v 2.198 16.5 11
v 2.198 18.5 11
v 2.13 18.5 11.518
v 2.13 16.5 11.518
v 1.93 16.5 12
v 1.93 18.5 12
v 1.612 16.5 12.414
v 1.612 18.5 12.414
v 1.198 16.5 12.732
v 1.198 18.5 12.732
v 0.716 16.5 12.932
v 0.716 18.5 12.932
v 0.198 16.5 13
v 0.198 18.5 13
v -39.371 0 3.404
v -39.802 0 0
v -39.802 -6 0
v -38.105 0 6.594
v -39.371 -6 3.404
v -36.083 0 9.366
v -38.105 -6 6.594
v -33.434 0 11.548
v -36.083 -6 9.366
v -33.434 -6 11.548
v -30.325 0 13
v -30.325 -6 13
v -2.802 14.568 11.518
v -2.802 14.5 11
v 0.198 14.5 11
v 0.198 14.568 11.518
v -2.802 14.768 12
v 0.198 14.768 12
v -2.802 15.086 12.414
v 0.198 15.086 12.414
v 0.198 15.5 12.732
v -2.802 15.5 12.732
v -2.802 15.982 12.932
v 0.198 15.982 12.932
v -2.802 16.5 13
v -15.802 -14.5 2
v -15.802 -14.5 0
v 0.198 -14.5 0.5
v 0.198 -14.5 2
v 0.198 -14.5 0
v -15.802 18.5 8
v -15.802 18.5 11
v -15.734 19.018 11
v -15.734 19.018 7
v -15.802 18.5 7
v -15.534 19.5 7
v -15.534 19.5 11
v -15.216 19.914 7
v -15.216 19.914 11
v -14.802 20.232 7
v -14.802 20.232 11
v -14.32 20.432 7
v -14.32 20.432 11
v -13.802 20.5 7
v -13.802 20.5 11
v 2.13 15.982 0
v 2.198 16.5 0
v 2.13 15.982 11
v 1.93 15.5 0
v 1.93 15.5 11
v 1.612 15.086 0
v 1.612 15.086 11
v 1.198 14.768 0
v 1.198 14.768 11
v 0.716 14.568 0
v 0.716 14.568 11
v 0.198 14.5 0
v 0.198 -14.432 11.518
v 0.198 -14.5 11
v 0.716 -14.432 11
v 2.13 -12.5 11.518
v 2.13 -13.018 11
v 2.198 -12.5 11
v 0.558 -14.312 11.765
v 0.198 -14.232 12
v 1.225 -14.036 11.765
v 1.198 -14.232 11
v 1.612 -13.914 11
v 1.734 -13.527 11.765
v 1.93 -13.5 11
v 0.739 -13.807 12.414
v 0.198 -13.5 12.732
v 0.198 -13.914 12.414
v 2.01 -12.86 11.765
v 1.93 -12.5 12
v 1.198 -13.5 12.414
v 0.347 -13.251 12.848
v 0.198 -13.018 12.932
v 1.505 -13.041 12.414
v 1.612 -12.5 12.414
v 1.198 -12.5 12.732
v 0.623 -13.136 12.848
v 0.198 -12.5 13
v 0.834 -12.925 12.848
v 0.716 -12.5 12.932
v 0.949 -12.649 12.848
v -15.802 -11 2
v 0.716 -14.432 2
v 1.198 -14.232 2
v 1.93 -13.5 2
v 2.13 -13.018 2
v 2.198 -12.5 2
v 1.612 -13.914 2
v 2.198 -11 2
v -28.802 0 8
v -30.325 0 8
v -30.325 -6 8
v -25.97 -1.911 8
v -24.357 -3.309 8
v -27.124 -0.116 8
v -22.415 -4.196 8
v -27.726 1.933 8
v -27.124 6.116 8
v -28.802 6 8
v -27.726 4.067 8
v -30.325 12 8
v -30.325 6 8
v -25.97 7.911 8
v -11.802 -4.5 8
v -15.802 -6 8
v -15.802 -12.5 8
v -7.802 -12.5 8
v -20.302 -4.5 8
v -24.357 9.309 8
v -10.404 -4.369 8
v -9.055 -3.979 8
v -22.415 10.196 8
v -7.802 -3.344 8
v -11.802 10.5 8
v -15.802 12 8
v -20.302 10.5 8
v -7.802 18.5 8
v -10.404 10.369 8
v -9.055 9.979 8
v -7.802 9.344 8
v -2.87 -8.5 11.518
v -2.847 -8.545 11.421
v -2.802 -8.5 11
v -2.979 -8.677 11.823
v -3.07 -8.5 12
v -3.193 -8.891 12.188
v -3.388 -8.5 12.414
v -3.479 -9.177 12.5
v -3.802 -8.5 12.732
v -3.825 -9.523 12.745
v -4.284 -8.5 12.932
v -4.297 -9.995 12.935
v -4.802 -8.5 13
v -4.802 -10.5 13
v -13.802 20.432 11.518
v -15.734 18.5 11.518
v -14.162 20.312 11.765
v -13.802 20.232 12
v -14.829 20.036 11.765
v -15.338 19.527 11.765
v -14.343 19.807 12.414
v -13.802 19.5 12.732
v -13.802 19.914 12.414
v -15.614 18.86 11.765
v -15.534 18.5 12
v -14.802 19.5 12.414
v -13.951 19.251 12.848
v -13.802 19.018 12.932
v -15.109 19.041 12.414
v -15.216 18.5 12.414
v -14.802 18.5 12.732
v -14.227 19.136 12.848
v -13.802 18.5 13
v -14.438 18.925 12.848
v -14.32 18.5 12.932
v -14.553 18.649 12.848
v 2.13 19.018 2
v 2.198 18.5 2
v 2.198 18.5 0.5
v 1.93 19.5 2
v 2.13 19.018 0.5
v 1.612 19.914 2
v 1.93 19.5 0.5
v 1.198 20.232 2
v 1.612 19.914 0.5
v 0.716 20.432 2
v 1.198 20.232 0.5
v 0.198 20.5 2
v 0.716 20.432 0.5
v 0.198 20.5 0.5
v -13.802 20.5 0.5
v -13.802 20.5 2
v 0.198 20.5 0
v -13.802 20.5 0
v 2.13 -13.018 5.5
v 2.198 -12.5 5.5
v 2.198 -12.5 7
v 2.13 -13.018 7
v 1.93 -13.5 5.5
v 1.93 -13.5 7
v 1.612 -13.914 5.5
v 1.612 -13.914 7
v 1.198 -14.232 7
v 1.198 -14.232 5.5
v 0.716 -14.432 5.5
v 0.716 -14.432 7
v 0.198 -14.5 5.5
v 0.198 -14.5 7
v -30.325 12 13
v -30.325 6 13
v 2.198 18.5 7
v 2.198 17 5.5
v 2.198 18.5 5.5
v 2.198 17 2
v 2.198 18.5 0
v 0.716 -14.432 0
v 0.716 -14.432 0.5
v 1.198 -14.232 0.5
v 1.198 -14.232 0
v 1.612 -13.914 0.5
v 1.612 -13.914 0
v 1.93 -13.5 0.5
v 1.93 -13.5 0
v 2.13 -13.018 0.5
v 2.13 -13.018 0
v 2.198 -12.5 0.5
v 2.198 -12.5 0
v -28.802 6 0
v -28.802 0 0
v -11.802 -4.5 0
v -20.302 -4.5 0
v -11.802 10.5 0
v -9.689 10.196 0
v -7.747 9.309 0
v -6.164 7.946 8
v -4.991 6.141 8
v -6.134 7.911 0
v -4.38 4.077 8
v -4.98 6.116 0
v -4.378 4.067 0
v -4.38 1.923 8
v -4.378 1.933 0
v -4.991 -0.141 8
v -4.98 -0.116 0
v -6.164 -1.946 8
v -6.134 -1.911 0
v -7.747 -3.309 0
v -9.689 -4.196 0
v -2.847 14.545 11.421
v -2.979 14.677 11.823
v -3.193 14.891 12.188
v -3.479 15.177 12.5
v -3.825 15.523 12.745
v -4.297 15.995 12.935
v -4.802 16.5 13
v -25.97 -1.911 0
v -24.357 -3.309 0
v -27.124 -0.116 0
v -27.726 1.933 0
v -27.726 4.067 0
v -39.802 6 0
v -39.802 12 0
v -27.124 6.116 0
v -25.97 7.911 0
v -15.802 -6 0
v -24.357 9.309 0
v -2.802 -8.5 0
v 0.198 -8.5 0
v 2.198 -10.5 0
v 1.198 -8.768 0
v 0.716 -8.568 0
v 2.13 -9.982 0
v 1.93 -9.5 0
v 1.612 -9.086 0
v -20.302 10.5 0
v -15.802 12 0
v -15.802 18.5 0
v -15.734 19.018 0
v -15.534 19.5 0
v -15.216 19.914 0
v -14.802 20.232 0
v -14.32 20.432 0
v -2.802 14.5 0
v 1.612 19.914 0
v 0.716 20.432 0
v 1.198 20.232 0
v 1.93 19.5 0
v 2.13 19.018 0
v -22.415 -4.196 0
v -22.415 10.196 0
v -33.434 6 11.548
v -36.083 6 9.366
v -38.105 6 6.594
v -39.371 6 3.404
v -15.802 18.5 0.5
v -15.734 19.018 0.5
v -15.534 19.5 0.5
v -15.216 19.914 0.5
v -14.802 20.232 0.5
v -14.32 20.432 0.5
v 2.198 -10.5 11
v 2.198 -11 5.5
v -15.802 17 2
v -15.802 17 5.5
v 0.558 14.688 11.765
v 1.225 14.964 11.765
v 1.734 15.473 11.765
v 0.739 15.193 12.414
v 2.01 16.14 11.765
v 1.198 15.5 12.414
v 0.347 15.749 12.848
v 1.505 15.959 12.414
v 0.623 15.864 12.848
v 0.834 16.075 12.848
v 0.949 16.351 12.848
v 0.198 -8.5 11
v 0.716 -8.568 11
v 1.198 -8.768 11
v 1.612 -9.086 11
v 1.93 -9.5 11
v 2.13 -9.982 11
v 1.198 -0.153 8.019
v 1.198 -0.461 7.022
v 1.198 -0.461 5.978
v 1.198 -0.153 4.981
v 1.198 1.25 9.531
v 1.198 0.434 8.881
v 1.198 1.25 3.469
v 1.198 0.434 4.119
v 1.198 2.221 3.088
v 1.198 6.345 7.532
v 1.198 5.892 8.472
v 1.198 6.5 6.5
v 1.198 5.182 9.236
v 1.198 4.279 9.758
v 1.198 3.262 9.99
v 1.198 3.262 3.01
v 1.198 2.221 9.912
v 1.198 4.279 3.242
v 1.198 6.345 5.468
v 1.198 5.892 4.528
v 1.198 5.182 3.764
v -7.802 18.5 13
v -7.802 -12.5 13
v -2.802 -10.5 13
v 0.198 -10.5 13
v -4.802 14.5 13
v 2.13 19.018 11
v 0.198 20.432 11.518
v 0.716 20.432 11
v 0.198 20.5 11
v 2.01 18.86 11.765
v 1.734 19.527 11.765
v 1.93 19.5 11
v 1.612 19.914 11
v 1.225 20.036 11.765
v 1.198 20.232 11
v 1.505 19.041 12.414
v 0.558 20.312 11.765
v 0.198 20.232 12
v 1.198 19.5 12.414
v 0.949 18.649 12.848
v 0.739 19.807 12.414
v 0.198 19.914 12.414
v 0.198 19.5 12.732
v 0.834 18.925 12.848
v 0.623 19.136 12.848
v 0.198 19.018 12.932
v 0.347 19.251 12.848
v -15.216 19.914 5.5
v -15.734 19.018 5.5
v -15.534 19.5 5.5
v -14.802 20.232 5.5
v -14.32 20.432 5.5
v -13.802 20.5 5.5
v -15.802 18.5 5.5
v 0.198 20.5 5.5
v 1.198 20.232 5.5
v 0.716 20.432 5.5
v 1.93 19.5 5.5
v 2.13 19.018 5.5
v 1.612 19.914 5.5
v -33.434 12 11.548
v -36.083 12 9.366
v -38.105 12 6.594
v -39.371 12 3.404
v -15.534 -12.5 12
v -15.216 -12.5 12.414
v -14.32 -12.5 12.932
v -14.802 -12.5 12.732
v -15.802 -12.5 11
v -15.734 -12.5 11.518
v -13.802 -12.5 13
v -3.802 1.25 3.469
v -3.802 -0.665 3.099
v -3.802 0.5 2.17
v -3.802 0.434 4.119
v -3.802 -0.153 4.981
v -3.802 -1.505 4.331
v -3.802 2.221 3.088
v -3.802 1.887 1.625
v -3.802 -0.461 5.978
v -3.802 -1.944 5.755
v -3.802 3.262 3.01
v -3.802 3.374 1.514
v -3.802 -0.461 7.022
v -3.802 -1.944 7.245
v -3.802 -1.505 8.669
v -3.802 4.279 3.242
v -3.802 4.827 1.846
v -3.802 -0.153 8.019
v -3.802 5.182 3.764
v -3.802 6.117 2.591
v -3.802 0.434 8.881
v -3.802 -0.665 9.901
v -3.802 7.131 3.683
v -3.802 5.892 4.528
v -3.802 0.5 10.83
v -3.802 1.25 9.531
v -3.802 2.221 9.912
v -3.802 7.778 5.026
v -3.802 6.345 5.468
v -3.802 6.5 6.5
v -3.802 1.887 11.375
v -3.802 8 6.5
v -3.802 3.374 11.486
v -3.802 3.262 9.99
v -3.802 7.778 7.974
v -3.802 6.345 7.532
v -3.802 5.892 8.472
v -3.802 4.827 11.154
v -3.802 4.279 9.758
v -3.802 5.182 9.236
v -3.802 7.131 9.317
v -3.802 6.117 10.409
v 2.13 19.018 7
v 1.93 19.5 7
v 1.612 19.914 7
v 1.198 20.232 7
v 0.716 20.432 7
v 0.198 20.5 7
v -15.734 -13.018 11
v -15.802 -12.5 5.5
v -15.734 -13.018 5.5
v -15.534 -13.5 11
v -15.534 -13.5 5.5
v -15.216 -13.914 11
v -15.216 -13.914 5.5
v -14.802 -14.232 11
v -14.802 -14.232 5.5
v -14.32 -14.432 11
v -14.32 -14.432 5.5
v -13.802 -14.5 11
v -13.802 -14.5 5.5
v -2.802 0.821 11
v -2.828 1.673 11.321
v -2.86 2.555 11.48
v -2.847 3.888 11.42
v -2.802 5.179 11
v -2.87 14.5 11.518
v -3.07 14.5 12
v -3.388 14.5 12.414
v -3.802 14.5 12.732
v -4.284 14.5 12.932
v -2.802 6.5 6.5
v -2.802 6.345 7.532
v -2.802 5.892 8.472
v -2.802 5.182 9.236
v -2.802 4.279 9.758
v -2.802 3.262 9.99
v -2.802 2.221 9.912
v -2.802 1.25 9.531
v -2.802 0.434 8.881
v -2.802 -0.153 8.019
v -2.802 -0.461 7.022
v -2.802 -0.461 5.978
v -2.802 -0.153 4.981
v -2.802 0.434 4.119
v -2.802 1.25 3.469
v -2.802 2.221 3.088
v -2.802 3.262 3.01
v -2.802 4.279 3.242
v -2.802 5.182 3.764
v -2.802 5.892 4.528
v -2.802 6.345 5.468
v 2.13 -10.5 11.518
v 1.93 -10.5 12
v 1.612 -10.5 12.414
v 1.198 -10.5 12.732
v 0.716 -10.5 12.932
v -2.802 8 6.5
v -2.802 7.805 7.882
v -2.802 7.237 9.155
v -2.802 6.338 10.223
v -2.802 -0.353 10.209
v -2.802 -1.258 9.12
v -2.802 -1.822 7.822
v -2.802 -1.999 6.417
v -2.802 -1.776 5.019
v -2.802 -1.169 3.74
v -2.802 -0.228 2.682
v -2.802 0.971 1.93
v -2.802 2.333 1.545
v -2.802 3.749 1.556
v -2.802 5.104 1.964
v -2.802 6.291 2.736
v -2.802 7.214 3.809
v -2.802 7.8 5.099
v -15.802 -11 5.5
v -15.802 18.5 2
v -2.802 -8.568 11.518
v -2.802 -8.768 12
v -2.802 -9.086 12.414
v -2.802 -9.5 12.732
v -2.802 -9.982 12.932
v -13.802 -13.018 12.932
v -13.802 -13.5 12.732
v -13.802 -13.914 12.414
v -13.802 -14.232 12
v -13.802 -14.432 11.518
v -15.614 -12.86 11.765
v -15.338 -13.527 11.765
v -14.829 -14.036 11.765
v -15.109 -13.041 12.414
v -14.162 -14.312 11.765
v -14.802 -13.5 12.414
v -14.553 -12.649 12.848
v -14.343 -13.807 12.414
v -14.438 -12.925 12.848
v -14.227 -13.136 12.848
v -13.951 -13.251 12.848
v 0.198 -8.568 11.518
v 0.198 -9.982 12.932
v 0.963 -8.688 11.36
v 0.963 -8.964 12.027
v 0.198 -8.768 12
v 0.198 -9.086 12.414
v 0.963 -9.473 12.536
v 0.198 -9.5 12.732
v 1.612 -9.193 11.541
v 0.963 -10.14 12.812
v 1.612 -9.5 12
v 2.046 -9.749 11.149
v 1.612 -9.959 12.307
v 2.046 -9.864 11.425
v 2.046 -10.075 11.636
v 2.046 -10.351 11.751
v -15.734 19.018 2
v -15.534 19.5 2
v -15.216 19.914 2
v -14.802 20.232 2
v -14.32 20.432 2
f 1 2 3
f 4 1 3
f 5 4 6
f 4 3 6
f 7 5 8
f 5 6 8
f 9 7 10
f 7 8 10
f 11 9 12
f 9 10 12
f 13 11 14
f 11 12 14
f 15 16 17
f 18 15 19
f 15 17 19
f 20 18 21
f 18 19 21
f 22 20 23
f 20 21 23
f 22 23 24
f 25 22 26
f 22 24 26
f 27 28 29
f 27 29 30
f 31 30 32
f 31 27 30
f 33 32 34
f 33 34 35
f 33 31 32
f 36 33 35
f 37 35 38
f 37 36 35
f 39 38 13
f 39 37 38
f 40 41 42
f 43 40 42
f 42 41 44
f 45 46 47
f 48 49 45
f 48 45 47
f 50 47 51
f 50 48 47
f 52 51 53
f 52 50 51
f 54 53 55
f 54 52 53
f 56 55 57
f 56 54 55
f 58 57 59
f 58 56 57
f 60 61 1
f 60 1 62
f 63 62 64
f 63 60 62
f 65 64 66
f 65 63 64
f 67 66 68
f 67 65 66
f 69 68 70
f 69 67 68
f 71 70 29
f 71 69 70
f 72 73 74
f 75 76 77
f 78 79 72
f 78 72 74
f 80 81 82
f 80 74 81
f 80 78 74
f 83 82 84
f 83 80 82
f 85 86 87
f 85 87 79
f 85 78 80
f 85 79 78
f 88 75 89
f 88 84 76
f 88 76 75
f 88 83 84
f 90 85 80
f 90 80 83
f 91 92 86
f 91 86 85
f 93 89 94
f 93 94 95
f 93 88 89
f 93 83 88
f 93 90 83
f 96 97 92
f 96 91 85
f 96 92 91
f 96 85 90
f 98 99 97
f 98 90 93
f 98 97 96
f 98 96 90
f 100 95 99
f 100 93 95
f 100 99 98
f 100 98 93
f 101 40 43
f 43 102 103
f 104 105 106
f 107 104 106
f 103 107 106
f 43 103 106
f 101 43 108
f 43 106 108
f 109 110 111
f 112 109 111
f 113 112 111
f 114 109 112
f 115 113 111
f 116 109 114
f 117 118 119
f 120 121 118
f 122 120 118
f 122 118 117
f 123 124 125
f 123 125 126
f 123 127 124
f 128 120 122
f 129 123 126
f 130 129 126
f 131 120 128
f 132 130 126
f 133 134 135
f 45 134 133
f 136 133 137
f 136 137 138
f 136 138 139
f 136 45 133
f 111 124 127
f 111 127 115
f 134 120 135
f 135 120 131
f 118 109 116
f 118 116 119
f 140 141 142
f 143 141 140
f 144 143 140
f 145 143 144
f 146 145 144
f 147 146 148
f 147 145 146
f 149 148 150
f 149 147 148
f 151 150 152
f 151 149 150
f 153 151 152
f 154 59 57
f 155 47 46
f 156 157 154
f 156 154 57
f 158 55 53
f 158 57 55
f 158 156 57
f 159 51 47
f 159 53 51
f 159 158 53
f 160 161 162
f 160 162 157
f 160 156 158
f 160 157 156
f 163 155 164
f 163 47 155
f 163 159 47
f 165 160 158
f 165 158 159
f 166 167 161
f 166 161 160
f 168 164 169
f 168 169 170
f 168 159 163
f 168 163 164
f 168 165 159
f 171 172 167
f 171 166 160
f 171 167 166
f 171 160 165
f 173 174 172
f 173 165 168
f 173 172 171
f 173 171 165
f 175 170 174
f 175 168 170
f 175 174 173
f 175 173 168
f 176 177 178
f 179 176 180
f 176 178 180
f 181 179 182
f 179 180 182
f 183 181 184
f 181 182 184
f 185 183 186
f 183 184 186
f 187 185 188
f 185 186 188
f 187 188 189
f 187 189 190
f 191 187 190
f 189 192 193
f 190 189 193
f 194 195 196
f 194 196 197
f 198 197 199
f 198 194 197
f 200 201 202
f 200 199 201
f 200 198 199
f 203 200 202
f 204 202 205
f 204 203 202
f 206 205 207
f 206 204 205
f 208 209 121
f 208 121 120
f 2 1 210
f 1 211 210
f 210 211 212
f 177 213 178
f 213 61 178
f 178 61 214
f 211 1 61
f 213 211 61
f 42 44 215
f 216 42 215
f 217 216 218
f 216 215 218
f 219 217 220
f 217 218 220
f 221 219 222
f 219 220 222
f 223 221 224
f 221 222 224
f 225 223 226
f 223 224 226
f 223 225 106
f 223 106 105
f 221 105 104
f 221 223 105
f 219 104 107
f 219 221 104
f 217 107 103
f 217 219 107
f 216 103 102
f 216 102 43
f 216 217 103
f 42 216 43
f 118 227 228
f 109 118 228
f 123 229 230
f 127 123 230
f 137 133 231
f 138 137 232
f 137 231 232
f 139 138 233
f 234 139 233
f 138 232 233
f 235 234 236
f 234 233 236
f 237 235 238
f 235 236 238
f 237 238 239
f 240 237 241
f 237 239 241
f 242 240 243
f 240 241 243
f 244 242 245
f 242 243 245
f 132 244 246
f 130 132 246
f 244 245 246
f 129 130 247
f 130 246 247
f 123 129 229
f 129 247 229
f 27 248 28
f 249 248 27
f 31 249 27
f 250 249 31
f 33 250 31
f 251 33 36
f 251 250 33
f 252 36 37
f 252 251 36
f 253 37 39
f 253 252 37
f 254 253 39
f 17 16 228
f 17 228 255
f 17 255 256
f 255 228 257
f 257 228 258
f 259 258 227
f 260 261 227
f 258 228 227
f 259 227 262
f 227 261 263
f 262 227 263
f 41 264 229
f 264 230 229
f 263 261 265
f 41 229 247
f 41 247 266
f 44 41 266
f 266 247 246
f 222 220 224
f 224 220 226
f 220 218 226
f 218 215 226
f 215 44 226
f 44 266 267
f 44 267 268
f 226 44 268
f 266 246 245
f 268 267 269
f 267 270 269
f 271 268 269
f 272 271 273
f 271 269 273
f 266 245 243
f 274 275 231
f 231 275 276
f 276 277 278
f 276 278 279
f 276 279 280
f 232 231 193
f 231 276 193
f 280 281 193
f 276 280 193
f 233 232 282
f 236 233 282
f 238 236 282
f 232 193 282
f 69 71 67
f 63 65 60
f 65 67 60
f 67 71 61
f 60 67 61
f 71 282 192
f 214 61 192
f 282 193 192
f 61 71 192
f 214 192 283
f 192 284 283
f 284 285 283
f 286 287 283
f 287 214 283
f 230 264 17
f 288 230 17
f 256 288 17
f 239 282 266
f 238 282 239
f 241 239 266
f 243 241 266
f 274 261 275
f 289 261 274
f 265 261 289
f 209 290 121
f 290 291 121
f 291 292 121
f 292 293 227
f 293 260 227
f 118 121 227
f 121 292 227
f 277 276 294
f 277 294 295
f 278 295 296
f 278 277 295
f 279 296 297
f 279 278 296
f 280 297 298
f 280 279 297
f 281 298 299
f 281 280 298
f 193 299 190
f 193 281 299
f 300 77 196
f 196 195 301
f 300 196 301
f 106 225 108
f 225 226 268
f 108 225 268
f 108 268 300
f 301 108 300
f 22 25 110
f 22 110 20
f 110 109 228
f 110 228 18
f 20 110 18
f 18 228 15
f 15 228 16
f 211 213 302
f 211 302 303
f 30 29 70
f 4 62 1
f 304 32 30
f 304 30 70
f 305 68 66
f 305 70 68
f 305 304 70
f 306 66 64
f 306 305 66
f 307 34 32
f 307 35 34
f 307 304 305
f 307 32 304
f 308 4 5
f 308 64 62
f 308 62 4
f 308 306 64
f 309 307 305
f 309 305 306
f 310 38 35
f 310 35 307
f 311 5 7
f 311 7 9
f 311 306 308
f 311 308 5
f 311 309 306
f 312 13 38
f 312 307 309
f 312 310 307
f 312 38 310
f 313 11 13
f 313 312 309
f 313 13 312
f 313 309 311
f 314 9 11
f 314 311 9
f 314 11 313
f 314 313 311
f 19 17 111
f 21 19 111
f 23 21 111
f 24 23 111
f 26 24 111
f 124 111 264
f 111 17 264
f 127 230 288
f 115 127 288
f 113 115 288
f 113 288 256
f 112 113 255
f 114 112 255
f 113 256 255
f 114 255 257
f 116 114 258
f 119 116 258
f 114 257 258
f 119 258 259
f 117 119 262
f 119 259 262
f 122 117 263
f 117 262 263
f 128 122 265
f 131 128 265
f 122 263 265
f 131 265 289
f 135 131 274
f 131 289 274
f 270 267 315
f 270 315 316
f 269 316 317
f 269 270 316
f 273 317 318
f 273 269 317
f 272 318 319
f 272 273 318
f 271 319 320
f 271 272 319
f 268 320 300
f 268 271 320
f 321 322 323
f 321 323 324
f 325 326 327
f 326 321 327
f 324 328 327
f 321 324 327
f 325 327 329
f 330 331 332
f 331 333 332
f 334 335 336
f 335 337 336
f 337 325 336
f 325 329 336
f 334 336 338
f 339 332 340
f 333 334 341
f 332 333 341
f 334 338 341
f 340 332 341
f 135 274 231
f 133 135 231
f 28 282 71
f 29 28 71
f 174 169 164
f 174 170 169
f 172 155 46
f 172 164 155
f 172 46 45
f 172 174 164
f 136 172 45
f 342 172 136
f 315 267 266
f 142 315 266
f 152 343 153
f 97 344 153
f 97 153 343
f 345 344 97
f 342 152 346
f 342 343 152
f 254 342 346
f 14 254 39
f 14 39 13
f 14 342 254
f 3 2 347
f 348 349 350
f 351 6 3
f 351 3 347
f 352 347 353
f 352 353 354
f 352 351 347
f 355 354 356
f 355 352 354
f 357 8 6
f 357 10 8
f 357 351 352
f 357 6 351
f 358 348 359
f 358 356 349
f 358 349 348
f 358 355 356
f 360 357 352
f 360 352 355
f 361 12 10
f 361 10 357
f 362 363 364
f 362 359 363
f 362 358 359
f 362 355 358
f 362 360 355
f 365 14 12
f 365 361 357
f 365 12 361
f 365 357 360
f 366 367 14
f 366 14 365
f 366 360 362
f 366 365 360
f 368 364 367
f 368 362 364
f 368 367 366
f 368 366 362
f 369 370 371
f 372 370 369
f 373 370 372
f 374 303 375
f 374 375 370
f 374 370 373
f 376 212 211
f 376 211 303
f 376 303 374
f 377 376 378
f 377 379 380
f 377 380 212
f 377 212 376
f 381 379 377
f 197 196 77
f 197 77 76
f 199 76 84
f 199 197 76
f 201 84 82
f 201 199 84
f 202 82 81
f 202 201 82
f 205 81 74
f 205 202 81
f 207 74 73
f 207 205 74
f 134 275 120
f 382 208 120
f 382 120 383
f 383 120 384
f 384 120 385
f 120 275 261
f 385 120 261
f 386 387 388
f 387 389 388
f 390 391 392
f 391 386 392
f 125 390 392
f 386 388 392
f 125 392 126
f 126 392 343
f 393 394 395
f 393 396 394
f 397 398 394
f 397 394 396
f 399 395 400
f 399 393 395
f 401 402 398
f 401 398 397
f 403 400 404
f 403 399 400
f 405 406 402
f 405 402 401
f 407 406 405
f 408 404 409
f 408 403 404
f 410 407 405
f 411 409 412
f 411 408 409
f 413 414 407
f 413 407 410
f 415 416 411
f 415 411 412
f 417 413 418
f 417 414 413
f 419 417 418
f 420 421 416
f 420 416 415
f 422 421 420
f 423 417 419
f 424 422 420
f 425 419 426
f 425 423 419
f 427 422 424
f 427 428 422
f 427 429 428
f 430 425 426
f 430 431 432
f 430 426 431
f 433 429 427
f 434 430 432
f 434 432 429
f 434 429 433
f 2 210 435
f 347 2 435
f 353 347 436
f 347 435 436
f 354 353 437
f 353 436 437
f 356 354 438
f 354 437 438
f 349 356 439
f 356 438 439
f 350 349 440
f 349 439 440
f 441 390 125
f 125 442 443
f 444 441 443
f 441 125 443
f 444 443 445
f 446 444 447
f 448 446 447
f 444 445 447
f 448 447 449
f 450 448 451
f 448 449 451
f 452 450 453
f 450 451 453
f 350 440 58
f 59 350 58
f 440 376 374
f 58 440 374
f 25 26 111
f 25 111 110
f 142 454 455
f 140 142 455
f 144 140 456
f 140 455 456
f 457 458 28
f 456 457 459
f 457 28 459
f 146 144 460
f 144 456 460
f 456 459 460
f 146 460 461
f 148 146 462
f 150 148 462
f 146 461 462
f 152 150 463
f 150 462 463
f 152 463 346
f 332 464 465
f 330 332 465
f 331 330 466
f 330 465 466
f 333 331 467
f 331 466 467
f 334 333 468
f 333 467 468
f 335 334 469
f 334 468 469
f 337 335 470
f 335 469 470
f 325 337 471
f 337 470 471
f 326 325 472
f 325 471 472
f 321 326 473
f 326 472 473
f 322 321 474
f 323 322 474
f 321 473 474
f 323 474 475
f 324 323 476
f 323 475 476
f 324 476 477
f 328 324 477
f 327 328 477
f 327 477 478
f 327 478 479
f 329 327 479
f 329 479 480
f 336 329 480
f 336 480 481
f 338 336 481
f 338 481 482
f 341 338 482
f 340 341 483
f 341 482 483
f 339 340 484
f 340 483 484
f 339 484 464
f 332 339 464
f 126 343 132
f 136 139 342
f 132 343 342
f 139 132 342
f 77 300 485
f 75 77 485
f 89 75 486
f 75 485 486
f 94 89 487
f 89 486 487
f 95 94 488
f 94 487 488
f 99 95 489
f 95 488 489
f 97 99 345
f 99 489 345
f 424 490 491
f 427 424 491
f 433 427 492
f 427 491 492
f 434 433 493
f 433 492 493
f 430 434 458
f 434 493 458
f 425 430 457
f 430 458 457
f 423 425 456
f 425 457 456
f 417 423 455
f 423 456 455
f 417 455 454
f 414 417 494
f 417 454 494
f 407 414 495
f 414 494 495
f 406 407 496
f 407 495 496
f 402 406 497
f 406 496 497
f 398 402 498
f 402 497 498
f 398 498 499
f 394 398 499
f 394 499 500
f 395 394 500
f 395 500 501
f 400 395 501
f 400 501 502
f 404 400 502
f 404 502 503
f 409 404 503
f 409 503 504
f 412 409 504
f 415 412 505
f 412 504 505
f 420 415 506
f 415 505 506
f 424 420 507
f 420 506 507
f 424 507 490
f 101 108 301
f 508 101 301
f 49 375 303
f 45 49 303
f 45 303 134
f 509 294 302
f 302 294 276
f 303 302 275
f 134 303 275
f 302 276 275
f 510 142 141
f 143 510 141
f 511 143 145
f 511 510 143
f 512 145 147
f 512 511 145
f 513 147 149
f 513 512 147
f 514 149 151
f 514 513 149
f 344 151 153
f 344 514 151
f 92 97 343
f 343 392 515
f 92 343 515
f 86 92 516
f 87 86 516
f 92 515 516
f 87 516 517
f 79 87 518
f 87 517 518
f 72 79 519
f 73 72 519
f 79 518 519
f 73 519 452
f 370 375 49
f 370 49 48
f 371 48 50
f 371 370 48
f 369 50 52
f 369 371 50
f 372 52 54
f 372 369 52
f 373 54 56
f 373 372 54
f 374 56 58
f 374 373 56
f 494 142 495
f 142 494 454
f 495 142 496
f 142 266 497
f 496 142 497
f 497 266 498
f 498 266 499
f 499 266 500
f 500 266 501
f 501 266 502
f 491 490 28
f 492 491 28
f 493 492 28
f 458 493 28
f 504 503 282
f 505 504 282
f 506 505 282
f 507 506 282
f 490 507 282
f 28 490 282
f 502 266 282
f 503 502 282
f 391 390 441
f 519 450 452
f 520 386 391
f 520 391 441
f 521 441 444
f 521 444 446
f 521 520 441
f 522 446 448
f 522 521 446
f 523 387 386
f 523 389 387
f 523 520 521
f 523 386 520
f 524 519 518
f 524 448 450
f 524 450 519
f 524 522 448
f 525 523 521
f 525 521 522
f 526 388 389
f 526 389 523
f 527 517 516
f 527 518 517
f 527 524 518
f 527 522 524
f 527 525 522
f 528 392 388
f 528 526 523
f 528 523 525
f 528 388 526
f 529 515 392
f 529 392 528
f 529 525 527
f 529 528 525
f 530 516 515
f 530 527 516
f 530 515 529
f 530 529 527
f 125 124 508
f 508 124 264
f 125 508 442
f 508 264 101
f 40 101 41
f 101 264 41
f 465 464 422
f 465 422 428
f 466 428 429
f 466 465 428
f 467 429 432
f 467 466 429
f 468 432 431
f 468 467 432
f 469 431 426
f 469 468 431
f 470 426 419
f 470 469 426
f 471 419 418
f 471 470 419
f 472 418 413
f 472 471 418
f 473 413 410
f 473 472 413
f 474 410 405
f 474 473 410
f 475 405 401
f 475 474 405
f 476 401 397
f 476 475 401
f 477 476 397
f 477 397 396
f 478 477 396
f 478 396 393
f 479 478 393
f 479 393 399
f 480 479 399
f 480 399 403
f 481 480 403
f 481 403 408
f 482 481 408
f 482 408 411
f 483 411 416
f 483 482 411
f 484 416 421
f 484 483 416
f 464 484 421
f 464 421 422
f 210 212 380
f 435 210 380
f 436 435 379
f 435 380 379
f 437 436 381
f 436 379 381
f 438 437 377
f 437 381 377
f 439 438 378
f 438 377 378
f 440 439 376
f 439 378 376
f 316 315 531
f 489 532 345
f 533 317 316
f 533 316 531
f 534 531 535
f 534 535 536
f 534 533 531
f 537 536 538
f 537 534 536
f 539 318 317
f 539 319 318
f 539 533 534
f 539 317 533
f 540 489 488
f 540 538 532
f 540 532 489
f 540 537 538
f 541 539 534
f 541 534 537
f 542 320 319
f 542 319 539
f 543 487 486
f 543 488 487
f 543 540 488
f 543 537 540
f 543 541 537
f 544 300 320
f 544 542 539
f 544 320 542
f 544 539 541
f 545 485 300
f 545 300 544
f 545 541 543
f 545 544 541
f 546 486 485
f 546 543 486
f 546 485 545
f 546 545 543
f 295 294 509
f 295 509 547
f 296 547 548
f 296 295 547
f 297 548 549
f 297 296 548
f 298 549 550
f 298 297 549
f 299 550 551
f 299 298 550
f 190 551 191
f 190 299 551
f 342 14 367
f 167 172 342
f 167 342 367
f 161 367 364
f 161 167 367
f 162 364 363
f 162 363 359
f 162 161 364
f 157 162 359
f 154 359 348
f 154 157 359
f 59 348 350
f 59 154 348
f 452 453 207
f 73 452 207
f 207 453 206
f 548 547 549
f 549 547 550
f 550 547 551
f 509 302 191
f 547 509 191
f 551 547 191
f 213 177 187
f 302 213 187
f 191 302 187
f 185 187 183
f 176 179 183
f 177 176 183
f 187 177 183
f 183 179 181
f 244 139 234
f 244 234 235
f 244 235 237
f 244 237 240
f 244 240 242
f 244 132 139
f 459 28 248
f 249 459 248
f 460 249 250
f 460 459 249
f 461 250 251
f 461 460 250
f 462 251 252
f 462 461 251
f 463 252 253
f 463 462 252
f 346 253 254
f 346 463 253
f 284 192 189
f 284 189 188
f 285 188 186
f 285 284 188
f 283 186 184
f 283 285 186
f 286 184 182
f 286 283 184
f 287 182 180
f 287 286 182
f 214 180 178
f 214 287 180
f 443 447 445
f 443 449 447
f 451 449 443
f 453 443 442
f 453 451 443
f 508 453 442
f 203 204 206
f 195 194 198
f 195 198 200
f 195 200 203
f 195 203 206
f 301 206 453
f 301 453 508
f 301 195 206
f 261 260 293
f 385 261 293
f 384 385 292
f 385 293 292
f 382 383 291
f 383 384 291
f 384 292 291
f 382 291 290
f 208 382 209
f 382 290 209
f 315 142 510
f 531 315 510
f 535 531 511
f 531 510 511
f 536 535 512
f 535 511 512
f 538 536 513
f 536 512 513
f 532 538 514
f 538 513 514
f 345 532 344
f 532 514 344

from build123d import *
from build123d import SkipClean  # not in build123d's __all__

# Parameters (mm, degrees)
F0_W          = 10
F0_H          = 6
F1_DEPTH      = 13
F3_DEPTH      = 25
F4_W          = 22.5231910496
F4_H          = 31
F5_DEPTH      = 5
F7_DEPTH      = 8
F8_R          = 5
F8_R_2        = 3.5
F9_DEPTH      = 1
F10_DEPTH     = 4
F11_W         = 3.5
F11_H         = 3.5
F12_DEPTH     = 42.001
F13_W         = 3.5
F13_H         = 3.5
F14_DEPTH     = 42.001
F15_T1_DEPTH  = 14
F15_T3_DEPTH  = 2
F15_T5_DEPTH  = 3
F15_T7_DEPTH  = 23
F15_T9_DEPTH  = 2
F15_T11_DEPTH = 10.5
F15_T13_DEPTH = 12
F15_T15_DEPTH = 16
F15_T17_DEPTH = 5.5
F15_S21_W     = 2.04
F15_S21_H     = 2.04
F15_T22_DEPTH = 2.04
F15_S27_W     = 2.04
F15_S27_H     = 2.04
F15_T28_DEPTH = 2.04
F15_S33_W     = 2.04
F15_S33_H     = 2.04
F15_T34_DEPTH = 2.04
F15_S39_W     = 2.04
F15_S39_H     = 2.04
F15_T40_DEPTH = 2.04
F15_S45_W     = 2.04
F15_S45_H     = 2.04
F15_T46_DEPTH = 2.04
F15_S51_W     = 2.04
F15_S51_H     = 2.04
F15_T52_DEPTH = 2.04
F15_T59_DEPTH = 28
F15_T63_DEPTH = 8
F15_T70_DEPTH = 8
F15_T74_DEPTH = 28


# Not quite as in the source:
# - a fillet or chamfer that OpenCascade refuses, or shapes differently, is made with other operations: its cross-section is extruded or revolved along the edge and cut away or added


with BuildPart() as f1:
    # F0 (on Top) → F1 (new body)
    with BuildSketch(Plane.XY):
        with Locations((-34.8019978553, 9)):
            Rectangle(F0_W, F0_H)
        with Locations((-34.8019978553, -3)):
            Rectangle(F0_W, F0_H)
        Polygon((2.1980021447, 20.5), (-15.8019978553, 20.5), (-15.8019978553, 12), (-29.8019978553, 12), (-29.8019978553, 6), (-28.8019978553, 6), (-28.8019978553, 0), (-29.8019978553, 0), (-29.8019978553, -6), (-15.8019978553, -6), (-15.8019978553, -14.5), (2.1980021447, -14.5), (2.1980021447, -8.5), (-2.8019978553, -8.5), (-2.8019978553, 14.5), (2.1980021447, 14.5), align=None)
    extrude(amount=F1_DEPTH)

    # F2 (on face) → F3 (cut)
    with BuildSketch(Plane.XZ.offset(6)):
        with BuildLine():
            Line((-39.8019978553, 13), (-39.8019978553, 0))
            ThreePointArc((-39.8019978553, 0), (-37.1813109556, 8.0437849903), (-30.3251889049, 13))
            Line((-30.3251889049, 13), (-39.8019978553, 13))
        make_face()
    extrude(amount=-F3_DEPTH, mode=Mode.SUBTRACT)

    # F4 (on face) → F5 (cut)
    with BuildSketch(Plane.XY.offset(13)):
        with Locations((-19.0635933801, 3)):
            Rectangle(F4_W, F4_H)
    extrude(amount=-F5_DEPTH, mode=Mode.SUBTRACT)

    # F6 (on face) → F7 (cut, through all)
    with BuildSketch(Plane(origin=(0, 0, 0), x_dir=(1, 0, 0), z_dir=(0, 0, -1))):
        with BuildLine():
            Line((-11.8019978553, 4.5), (-20.3019978553, 4.5))
            ThreePointArc((-20.3019978553, 4.5), (-27.8019978553, -3), (-20.3019978553, -10.5))
            Line((-20.3019978553, -10.5), (-11.8019978553, -10.5))
            ThreePointArc((-11.8019978553, -10.5), (-4.3019978553, -3), (-11.8019978553, 4.5))
        make_face()
    extrude(amount=-F7_DEPTH, mode=Mode.SUBTRACT)

    # F8 (on face) → F9 (cut)
    with BuildSketch(Plane.YZ.offset(-2.8019978553)):
        with Locations((3, 6.5)):
            Circle(F8_R)
        with Locations((3, 6.5)):
            Circle(F8_R_2, mode=Mode.SUBTRACT)
    extrude(amount=-F9_DEPTH, mode=Mode.SUBTRACT)

    # F10 (add): a face of the model
    f10_faces = [f1.faces().sort_by_distance(p)[0] for p in [
        (-2.8019978553, 3, 6.5),
    ]]
    extrude(f10_faces, amount=F10_DEPTH)

    # F11 (on face) → F12 (cut, through all)
    with BuildSketch(Plane.YZ.offset(2.1980021447)):
        with Locations((-12.75, 3.75)):
            Rectangle(F11_W, F11_H)
    extrude(amount=-F12_DEPTH, mode=Mode.SUBTRACT)

    # F13 (on face) → F14 (cut, through all)
    with BuildSketch(Plane.YZ.offset(2.1980021447)):
        with Locations((18.75, 3.75)):
            Rectangle(F13_W, F13_H)
    extrude(amount=-F14_DEPTH, mode=Mode.SUBTRACT)

    # F15: fillet of radius 2 on 18 edges, made by hand

    # F15_s2 → F15_t1 (cut)
    with BuildSketch(Plane.YZ.offset(-13.8019978553)):
        with BuildLine():
            ThreePointArc((-12.5, 13), (-13.9142135624, 12.4142135624), (-14.5, 11))
            Line((-14.5, 11), (-14.5, 13))
            Line((-14.5, 13), (-12.5, 13))
        make_face()
        with BuildLine():
            ThreePointArc((18.5, 13), (19.9142135624, 12.4142135624), (20.5, 11))
            Line((20.5, 11), (20.5, 13))
            Line((20.5, 13), (18.5, 13))
        make_face()
    extrude(amount=F15_T1_DEPTH, mode=Mode.SUBTRACT)

    # F15_s4 → F15_t3 (cut)
    with BuildSketch(Plane.XZ.offset(10.5)):
        with BuildLine():
            ThreePointArc((2.1980021447, 11), (1.6122157071, 12.4142135624), (0.1980021447, 13))
            Line((0.1980021447, 13), (2.1980021447, 13))
            Line((2.1980021447, 13), (2.1980021447, 11))
        make_face()
    extrude(amount=F15_T3_DEPTH, mode=Mode.SUBTRACT)

    # F15_s6 → F15_t5 (cut)
    with BuildSketch(Plane.YZ.offset(-2.8019978553)):
        with BuildLine():
            ThreePointArc((-8.5, 11), (-9.0857864376, 12.4142135624), (-10.5, 13))
            Line((-10.5, 13), (-8.5, 13))
            Line((-8.5, 13), (-8.5, 11))
        make_face()
        with BuildLine():
            ThreePointArc((14.5, 11), (15.0857864376, 12.4142135624), (16.5, 13))
            Line((16.5, 13), (14.5, 13))
            Line((14.5, 13), (14.5, 11))
        make_face()
    extrude(amount=F15_T5_DEPTH, mode=Mode.SUBTRACT)

    # F15_s8 → F15_t7 (cut)
    with BuildSketch(Plane.XZ.offset(-14.5)):
        with BuildLine():
            ThreePointArc((-2.8019978553, 11), (-3.3877842929, 12.4142135624), (-4.8019978553, 13))
            Line((-4.8019978553, 13), (-2.8019978553, 13))
            Line((-2.8019978553, 13), (-2.8019978553, 11))
        make_face()
    extrude(amount=F15_T7_DEPTH, mode=Mode.SUBTRACT)

    # F15_s10 → F15_t9 (cut)
    with BuildSketch(Plane.XZ.offset(-18.5)):
        with BuildLine():
            ThreePointArc((2.1980021447, 11), (1.6122157071, 12.4142135624), (0.1980021447, 13))
            Line((0.1980021447, 13), (2.1980021447, 13))
            Line((2.1980021447, 13), (2.1980021447, 11))
        make_face()
    extrude(amount=F15_T9_DEPTH, mode=Mode.SUBTRACT)

    # F15_s12 → F15_t11 (cut)
    with BuildSketch(Plane.XY.offset(0.5)):
        with BuildLine():
            ThreePointArc((2.1980021447, 18.5), (1.6122157071, 19.9142135624), (0.1980021447, 20.5))
            Line((0.1980021447, 20.5), (2.1980021447, 20.5))
            Line((2.1980021447, 20.5), (2.1980021447, 18.5))
        make_face()
        with BuildLine():
            ThreePointArc((-15.8019978553, 18.5), (-15.2162114177, 19.9142135624), (-13.8019978553, 20.5))
            Line((-13.8019978553, 20.5), (-15.8019978553, 20.5))
            Line((-15.8019978553, 20.5), (-15.8019978553, 18.5))
        make_face()
        with BuildLine():
            ThreePointArc((2.1980021447, -12.5), (1.6122157071, -13.9142135624), (0.1980021447, -14.5))
            Line((0.1980021447, -14.5), (2.1980021447, -14.5))
            Line((2.1980021447, -14.5), (2.1980021447, -12.5))
        make_face()
    extrude(amount=F15_T11_DEPTH, mode=Mode.SUBTRACT)

    # F15_s14 → F15_t13 (cut)
    with BuildSketch(Plane.XY.offset(-5)):
        with BuildLine():
            ThreePointArc((-15.8019978553, 18.5), (-15.2162114177, 19.9142135624), (-13.8019978553, 20.5))
            Line((-13.8019978553, 20.5), (-15.8019978553, 20.5))
            Line((-15.8019978553, 20.5), (-15.8019978553, 18.5))
        make_face()
        with BuildLine():
            ThreePointArc((0.1980021447, -14.5), (1.6122157071, -13.9142135624), (2.1980021447, -12.5))
            Line((2.1980021447, -12.5), (2.1980021447, -14.5))
            Line((2.1980021447, -14.5), (0.1980021447, -14.5))
        make_face()
        with BuildLine():
            ThreePointArc((0.1980021447, 20.5), (1.6122157071, 19.9142135624), (2.1980021447, 18.5))
            Line((2.1980021447, 18.5), (2.1980021447, 20.5))
            Line((2.1980021447, 20.5), (0.1980021447, 20.5))
        make_face()
    with SkipClean():  # cleaning this boolean's faces spoils the solid; the shape is the same uncleaned
        extrude(amount=F15_T13_DEPTH, mode=Mode.SUBTRACT)

    # F15_s16 → F15_t15 (cut)
    with BuildSketch(Plane.XY.offset(-5)):
        with BuildLine():
            ThreePointArc((0.1980021447, -8.5), (1.6122157071, -9.0857864376), (2.1980021447, -10.5))
            Line((2.1980021447, -10.5), (2.1980021447, -8.5))
            Line((2.1980021447, -8.5), (0.1980021447, -8.5))
        make_face()
        with BuildLine():
            ThreePointArc((2.1980021447, 16.5), (1.6122157071, 15.0857864376), (0.1980021447, 14.5))
            Line((0.1980021447, 14.5), (2.1980021447, 14.5))
            Line((2.1980021447, 14.5), (2.1980021447, 16.5))
        make_face()
    extrude(amount=F15_T15_DEPTH, mode=Mode.SUBTRACT)

    # F15_s18 → F15_t17 (cut)
    with BuildSketch(Plane.XY.offset(5.5)):
        with BuildLine():
            ThreePointArc((-15.8019978553, -12.5), (-15.2162114177, -13.9142135624), (-13.8019978553, -14.5))
            Line((-13.8019978553, -14.5), (-15.8019978553, -14.5))
            Line((-15.8019978553, -14.5), (-15.8019978553, -12.5))
        make_face()
    extrude(amount=F15_T17_DEPTH, mode=Mode.SUBTRACT)


with BuildPart() as f15_tool20:
    # F15_s21 → F15_t22 (new body)
    with BuildSketch(Plane.XY.offset(11)):
        with Locations((-14.8219978553, -13.52)):
            Rectangle(F15_S21_W, F15_S21_H)
    extrude(amount=F15_T22_DEPTH)

    # F15_s23 → F15_t24 (revolve, cut)
    with BuildSketch(Plane(origin=(-13.8019978553, -12.5, 11), x_dir=(0.7071067812, 0.7071067812, 0), z_dir=(0.7071067812, -0.7071067812, 0))):
        with BuildLine():
            ThreePointArc((0, -2), (2, 0), (0, 2))
            Line((0, 2), (0, -2))
        make_face()
    revolve(axis=Axis((-13.8019978553, -12.5, 11), (0, 0, 1)), mode=Mode.SUBTRACT)


with BuildPart() as f1_1:
    add(f1.part, clean=False)

    # F15_t19: cut F15_tool20
    add(f15_tool20.part, mode=Mode.SUBTRACT)


with BuildPart() as f15_tool26:
    # F15_s27 → F15_t28 (new body)
    with BuildSketch(Plane.XY.offset(11)):
        with Locations((1.2180021447, -13.52)):
            Rectangle(F15_S27_W, F15_S27_H)
    extrude(amount=F15_T28_DEPTH)

    # F15_s29 → F15_t30 (revolve, cut)
    with BuildSketch(Plane(origin=(0.1980021447, -12.5, 11), x_dir=(-0.7071067812, 0.7071067812, 0), z_dir=(0.7071067812, 0.7071067812, 0))):
        with BuildLine():
            ThreePointArc((0, -2), (2, 0), (0, 2))
            Line((0, 2), (0, -2))
        make_face()
    revolve(axis=Axis((0.1980021447, -12.5, 11), (0, 0, 1)), mode=Mode.SUBTRACT)


with BuildPart() as f1_2:
    add(f1_1.part, clean=False)

    # F15_t25: cut F15_tool26
    add(f15_tool26.part, mode=Mode.SUBTRACT)


with BuildPart() as f15_tool32:
    # F15_s33 → F15_t34 (new body)
    with BuildSketch(Plane.YZ.offset(0.1980021447)):
        with Locations((-9.48, 12.02)):
            Rectangle(F15_S33_W, F15_S33_H)
    extrude(amount=F15_T34_DEPTH)

    # F15_s35 → F15_t36 (revolve, cut)
    with BuildSketch(Plane(origin=(0.1980021447, -10.5, 11), x_dir=(0, -0.7071067812, -0.7071067812), z_dir=(0, -0.7071067812, 0.7071067812))):
        with BuildLine():
            ThreePointArc((0, -2), (2, 0), (0, 2))
            Line((0, 2), (0, -2))
        make_face()
    revolve(axis=Axis((0.1980021447, -10.5, 11), (1, 0, 0)), mode=Mode.SUBTRACT)


with BuildPart() as f1_3:
    add(f1_2.part, clean=False)

    # F15_t31: cut F15_tool32
    add(f15_tool32.part, mode=Mode.SUBTRACT)


with BuildPart() as f15_tool38:
    # F15_s39 → F15_t40 (new body)
    with BuildSketch(Plane.XY.offset(11)):
        with Locations((1.2180021447, 15.48)):
            Rectangle(F15_S39_W, F15_S39_H)
    extrude(amount=F15_T40_DEPTH)

    # F15_s41 → F15_t42 (revolve, cut)
    with BuildSketch(Plane(origin=(0.1980021447, 16.5, 11), x_dir=(-0.7071067812, 0.7071067812, 0), z_dir=(0.7071067812, 0.7071067812, 0))):
        with BuildLine():
            ThreePointArc((0, -2), (2, 0), (0, 2))
            Line((0, 2), (0, -2))
        make_face()
    revolve(axis=Axis((0.1980021447, 16.5, 11), (0, 0, 1)), mode=Mode.SUBTRACT)


with BuildPart() as f1_4:
    add(f1_3.part, clean=False)

    # F15_t37: cut F15_tool38
    add(f15_tool38.part, mode=Mode.SUBTRACT)


with BuildPart() as f15_tool44:
    # F15_s45 → F15_t46 (new body)
    with BuildSketch(Plane.XY.offset(11)):
        with Locations((1.2180021447, 19.52)):
            Rectangle(F15_S45_W, F15_S45_H)
    extrude(amount=F15_T46_DEPTH)

    # F15_s47 → F15_t48 (revolve, cut)
    with BuildSketch(Plane(origin=(0.1980021447, 18.5, 11), x_dir=(-0.7071067812, -0.7071067812, 0), z_dir=(-0.7071067812, 0.7071067812, 0))):
        with BuildLine():
            ThreePointArc((0, -2), (2, 0), (0, 2))
            Line((0, 2), (0, -2))
        make_face()
    revolve(axis=Axis((0.1980021447, 18.5, 11), (0, 0, 1)), mode=Mode.SUBTRACT)


with BuildPart() as f1_5:
    add(f1_4.part, clean=False)

    # F15_t43: cut F15_tool44
    add(f15_tool44.part, mode=Mode.SUBTRACT)


with BuildPart() as f15_tool50:
    # F15_s51 → F15_t52 (new body)
    with BuildSketch(Plane.XY.offset(11)):
        with Locations((-14.8219978553, 19.52)):
            Rectangle(F15_S51_W, F15_S51_H)
    extrude(amount=F15_T52_DEPTH)

    # F15_s53 → F15_t54 (revolve, cut)
    with BuildSketch(Plane(origin=(-13.8019978553, 18.5, 11), x_dir=(0.7071067812, -0.7071067812, 0), z_dir=(-0.7071067812, -0.7071067812, 0))):
        with BuildLine():
            ThreePointArc((0, -2), (2, 0), (0, 2))
            Line((0, 2), (0, -2))
        make_face()
    revolve(axis=Axis((-13.8019978553, 18.5, 11), (0, 0, 1)), mode=Mode.SUBTRACT)


with BuildPart() as f1_6:
    add(f1_5.part, clean=False)

    # F15_t49: cut F15_tool50
    add(f15_tool50.part, mode=Mode.SUBTRACT)


with BuildPart() as f15_tool57:
    # F15_s58 → F15_t59 (new body)
    with BuildSketch(Plane.XZ.offset(13.5)):
        with BuildLine():
            ThreePointArc((-2.8019978553, 11), (-3.3877842929, 12.4142135624), (-4.8019978553, 13))
            Line((-4.8019978553, 13), (-2.8019978553, 13))
            Line((-2.8019978553, 13), (-2.8019978553, 11))
        make_face()
    extrude(amount=-F15_T59_DEPTH)

    split(bisect_by=Plane.XZ.offset(8.5), keep=Keep.TOP)


with BuildPart() as f15_tool61:
    # F15_s62 → F15_t63 (new body)
    with BuildSketch(Plane.YZ.offset(0.1980021447)):
        with BuildLine():
            ThreePointArc((-8.5, 11), (-9.0857864376, 12.4142135624), (-10.5, 13))
            Line((-10.5, 13), (-8.5, 13))
            Line((-8.5, 13), (-8.5, 11))
        make_face()
    extrude(amount=-F15_T63_DEPTH)

    split(bisect_by=Plane.YZ.offset(-2.8019978553), keep=Keep.BOTTOM)


with BuildPart() as f15_tool57_1:
    add(f15_tool57.part, clean=False)

    # F15_t65: intersect F15_tool61
    add(f15_tool61.part, mode=Mode.INTERSECT)


with BuildPart() as f1_7:
    add(f1_6.part, clean=False)

    # F15_t55: cut F15_tool57
    add(f15_tool57_1.part, mode=Mode.SUBTRACT)


with BuildPart() as f15_tool68:
    # F15_s69 → F15_t70 (new body)
    with BuildSketch(Plane.YZ.offset(-7.8019978553)):
        with BuildLine():
            ThreePointArc((14.5, 11), (15.0857864376, 12.4142135624), (16.5, 13))
            Line((16.5, 13), (14.5, 13))
            Line((14.5, 13), (14.5, 11))
        make_face()
    extrude(amount=F15_T70_DEPTH)

    split(bisect_by=Plane.YZ.offset(-2.8019978553), keep=Keep.BOTTOM)


with BuildPart() as f15_tool72:
    # F15_s73 → F15_t74 (new body)
    with BuildSketch(Plane.XZ.offset(8.5)):
        with BuildLine():
            ThreePointArc((-2.8019978553, 11), (-3.3877842929, 12.4142135624), (-4.8019978553, 13))
            Line((-4.8019978553, 13), (-2.8019978553, 13))
            Line((-2.8019978553, 13), (-2.8019978553, 11))
        make_face()
    extrude(amount=-F15_T74_DEPTH)

    split(bisect_by=Plane.XZ.offset(-14.5), keep=Keep.BOTTOM)


with BuildPart() as f15_tool68_1:
    add(f15_tool68.part, clean=False)

    # F15_t76: intersect F15_tool72
    add(f15_tool72.part, mode=Mode.INTERSECT)


with BuildPart() as f1_8:
    add(f1_7.part, clean=False)

    # F15_t66: cut F15_tool68
    add(f15_tool68_1.part, mode=Mode.SUBTRACT)


solid = f1_8.part
